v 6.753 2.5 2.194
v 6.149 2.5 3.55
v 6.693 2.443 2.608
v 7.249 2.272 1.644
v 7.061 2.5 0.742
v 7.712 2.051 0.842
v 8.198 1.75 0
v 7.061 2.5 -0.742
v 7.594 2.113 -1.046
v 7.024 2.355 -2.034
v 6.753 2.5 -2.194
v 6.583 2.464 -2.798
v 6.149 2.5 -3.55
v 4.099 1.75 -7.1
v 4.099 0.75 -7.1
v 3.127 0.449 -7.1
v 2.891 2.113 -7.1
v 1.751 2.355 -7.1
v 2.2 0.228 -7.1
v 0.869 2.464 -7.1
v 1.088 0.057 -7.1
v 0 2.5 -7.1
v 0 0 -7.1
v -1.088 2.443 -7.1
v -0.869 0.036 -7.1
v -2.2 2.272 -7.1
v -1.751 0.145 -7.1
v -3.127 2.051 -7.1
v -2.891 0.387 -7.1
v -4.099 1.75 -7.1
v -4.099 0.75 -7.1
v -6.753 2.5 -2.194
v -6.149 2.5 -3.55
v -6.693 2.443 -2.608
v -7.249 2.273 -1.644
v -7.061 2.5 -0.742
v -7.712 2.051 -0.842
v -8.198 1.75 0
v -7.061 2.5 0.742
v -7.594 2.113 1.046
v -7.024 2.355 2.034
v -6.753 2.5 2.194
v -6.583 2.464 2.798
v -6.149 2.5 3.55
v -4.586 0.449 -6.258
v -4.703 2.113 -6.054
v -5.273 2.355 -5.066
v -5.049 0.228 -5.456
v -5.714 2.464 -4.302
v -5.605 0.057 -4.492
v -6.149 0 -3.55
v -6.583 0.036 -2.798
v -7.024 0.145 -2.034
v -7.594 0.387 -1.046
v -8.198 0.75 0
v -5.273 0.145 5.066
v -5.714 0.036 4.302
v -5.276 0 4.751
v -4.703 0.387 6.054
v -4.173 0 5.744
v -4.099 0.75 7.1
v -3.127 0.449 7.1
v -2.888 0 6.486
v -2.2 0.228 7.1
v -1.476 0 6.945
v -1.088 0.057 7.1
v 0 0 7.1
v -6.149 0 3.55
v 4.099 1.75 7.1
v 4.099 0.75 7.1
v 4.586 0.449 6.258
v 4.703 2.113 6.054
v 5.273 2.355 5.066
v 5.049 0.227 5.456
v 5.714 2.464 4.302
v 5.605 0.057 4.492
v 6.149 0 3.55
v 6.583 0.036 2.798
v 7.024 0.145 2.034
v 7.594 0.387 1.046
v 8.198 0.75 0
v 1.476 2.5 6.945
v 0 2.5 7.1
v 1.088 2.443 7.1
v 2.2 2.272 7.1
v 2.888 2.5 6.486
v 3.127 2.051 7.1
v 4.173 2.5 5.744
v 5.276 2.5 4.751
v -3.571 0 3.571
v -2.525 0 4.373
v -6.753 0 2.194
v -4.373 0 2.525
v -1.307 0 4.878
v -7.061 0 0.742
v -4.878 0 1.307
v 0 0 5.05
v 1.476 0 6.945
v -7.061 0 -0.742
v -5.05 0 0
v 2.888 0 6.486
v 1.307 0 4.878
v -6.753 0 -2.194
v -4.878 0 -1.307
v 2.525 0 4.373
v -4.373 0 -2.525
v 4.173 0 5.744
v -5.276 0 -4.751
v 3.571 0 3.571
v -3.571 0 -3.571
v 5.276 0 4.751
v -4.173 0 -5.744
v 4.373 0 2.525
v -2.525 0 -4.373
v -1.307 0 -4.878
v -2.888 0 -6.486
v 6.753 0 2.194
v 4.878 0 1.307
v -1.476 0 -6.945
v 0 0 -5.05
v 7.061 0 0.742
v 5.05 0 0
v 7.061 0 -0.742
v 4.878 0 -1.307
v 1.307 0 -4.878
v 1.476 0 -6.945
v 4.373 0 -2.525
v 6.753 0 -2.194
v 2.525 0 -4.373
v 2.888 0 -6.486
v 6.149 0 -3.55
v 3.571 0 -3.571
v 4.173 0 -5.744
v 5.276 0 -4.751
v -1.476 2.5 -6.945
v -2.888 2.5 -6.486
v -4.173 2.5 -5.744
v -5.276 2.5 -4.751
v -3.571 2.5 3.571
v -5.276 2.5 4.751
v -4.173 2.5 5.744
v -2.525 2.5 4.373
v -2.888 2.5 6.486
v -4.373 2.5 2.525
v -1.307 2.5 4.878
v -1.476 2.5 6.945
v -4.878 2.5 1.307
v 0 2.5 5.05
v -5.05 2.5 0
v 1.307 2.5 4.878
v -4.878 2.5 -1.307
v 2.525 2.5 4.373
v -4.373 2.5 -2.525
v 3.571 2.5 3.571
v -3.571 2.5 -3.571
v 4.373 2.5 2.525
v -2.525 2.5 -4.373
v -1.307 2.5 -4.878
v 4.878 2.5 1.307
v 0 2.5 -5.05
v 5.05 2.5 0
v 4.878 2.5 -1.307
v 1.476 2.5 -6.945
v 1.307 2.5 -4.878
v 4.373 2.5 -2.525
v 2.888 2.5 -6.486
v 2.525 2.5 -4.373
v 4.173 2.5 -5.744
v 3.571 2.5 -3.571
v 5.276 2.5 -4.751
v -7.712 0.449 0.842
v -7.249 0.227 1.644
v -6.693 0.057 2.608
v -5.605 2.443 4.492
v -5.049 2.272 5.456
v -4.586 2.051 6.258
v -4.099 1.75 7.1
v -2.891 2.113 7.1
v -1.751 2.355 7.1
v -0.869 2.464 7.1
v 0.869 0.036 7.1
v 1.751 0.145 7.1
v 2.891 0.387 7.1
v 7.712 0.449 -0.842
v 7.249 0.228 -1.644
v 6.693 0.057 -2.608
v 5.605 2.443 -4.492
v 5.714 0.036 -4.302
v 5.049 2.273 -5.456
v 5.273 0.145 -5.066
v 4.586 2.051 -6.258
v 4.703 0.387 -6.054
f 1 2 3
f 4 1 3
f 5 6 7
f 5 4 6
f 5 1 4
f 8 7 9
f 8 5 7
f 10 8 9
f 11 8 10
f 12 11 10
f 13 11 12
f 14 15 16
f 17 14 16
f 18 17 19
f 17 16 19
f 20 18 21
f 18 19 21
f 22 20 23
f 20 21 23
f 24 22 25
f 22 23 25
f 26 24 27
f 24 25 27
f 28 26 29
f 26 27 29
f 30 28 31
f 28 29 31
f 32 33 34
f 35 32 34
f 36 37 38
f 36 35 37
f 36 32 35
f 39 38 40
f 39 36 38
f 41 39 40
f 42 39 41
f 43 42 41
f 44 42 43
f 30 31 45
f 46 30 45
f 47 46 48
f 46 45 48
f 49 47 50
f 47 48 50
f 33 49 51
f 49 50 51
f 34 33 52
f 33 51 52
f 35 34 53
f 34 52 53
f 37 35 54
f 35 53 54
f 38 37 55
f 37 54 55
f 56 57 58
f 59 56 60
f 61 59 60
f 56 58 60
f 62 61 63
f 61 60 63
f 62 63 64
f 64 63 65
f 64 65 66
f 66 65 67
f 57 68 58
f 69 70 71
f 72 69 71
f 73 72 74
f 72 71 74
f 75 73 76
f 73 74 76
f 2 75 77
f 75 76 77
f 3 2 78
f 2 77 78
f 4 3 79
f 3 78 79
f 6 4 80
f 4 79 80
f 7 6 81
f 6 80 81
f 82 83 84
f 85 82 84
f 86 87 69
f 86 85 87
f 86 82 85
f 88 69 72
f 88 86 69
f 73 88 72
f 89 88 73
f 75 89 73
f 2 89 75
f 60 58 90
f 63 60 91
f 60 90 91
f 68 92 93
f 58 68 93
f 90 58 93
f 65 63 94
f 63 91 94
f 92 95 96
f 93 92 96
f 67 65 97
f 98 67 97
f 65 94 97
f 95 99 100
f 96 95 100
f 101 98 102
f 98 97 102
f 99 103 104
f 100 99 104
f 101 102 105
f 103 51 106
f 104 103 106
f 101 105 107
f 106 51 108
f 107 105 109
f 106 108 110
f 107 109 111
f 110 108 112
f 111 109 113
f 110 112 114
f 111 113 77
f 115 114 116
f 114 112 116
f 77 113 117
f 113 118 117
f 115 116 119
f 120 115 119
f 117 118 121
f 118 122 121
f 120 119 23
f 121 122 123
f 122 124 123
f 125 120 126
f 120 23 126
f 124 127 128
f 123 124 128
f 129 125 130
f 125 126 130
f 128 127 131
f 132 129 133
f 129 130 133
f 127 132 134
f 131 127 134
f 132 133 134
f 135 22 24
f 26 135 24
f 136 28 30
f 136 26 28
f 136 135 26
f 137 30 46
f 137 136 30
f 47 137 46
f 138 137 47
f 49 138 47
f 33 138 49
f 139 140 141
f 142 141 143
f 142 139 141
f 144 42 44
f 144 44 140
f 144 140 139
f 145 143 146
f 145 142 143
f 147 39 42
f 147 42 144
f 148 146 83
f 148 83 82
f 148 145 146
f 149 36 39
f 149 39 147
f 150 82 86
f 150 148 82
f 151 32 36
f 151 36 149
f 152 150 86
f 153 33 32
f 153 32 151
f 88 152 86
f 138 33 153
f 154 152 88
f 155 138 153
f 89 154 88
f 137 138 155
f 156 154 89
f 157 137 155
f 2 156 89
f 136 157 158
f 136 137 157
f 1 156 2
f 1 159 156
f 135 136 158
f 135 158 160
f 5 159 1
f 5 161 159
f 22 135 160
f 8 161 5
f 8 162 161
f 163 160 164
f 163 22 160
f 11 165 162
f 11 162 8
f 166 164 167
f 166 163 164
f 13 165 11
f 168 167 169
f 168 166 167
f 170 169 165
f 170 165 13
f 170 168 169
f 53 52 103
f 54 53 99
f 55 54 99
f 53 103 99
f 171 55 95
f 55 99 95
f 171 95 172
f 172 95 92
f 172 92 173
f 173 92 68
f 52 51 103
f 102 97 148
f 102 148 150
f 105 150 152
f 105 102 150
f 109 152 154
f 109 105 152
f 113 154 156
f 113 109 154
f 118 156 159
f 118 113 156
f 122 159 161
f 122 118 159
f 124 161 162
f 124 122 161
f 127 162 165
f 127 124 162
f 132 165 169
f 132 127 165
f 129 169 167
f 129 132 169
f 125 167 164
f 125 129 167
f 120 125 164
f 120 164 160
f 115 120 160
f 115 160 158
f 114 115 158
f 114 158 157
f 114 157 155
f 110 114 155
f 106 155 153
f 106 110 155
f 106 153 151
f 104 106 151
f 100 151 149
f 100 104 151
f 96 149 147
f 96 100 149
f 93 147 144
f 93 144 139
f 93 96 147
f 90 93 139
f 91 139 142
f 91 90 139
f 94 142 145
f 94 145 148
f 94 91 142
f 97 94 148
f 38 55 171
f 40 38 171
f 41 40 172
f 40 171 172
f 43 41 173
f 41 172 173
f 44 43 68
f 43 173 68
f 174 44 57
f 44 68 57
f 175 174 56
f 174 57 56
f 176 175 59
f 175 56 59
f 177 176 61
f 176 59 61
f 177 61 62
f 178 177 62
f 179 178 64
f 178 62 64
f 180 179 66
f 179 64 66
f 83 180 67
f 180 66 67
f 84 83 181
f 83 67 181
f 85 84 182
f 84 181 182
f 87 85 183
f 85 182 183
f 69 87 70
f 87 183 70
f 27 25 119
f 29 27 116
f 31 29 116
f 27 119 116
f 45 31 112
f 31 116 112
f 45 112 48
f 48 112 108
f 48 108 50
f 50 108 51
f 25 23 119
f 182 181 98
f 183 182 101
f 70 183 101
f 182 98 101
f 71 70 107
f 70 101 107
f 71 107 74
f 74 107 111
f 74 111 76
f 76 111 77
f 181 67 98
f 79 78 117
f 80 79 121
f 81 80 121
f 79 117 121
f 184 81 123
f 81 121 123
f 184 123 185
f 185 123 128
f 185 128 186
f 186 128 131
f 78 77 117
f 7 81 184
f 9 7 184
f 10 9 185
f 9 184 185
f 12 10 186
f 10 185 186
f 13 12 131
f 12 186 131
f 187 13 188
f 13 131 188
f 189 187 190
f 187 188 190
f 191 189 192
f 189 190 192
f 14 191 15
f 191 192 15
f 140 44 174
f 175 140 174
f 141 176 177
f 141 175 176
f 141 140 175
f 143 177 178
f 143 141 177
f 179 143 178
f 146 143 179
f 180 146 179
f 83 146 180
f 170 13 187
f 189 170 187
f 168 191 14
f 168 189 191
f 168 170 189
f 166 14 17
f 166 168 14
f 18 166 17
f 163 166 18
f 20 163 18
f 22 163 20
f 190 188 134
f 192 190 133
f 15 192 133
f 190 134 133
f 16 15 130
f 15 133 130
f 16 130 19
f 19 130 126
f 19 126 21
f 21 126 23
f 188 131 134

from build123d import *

# Parameters (mm, degrees)
SKIZZE1_R                       = 5.05
AUFSATZ_LINEAR_AUSTRAGEN1_DEPTH = 2.5


with BuildPart() as part:
    # Skizze1 → Aufsatz-Linear austragen1 (new body)
    with BuildSketch(Plane(origin=(0, 0, 0), x_dir=(1, 0, 0), z_dir=(0, 1, 0))):
        Polygon((8.198373822, 0), (4.099186911, 7.1), (-4.099186911, 7.1), (-8.198373822, 0), (-4.099186911, -7.1), (4.099186911, -7.1), align=None)
        with Locations(Location((0, 0, 0), (0, 0, 270))):
            Circle(SKIZZE1_R, mode=Mode.SUBTRACT)
    extrude(amount=AUFSATZ_LINEAR_AUSTRAGEN1_DEPTH)

    # Skizze4 → Schnitt-Rotation1 (revolve, cut)
    with BuildSketch(Plane(origin=(0, 0, 0), x_dir=(0.49999999999999506, 0, -0.8660254037844415), z_dir=(0.8660254037844415, 0, 0.49999999999999506))):
        Polygon((-8.198373822, 0.75), (-7.1, 0), (-8.198373822, 0), align=None)
    schnitt_rotation1 = revolve(axis=Axis((0, 0, 0), (0, 1, 0)), mode=Mode.SUBTRACT)

    # Spiegeln1: Schnitt-Rotation1 across plane
    add(schnitt_rotation1.mirror(Plane.ZX.offset(1.25)), mode=Mode.SUBTRACT)


solid = part.part
